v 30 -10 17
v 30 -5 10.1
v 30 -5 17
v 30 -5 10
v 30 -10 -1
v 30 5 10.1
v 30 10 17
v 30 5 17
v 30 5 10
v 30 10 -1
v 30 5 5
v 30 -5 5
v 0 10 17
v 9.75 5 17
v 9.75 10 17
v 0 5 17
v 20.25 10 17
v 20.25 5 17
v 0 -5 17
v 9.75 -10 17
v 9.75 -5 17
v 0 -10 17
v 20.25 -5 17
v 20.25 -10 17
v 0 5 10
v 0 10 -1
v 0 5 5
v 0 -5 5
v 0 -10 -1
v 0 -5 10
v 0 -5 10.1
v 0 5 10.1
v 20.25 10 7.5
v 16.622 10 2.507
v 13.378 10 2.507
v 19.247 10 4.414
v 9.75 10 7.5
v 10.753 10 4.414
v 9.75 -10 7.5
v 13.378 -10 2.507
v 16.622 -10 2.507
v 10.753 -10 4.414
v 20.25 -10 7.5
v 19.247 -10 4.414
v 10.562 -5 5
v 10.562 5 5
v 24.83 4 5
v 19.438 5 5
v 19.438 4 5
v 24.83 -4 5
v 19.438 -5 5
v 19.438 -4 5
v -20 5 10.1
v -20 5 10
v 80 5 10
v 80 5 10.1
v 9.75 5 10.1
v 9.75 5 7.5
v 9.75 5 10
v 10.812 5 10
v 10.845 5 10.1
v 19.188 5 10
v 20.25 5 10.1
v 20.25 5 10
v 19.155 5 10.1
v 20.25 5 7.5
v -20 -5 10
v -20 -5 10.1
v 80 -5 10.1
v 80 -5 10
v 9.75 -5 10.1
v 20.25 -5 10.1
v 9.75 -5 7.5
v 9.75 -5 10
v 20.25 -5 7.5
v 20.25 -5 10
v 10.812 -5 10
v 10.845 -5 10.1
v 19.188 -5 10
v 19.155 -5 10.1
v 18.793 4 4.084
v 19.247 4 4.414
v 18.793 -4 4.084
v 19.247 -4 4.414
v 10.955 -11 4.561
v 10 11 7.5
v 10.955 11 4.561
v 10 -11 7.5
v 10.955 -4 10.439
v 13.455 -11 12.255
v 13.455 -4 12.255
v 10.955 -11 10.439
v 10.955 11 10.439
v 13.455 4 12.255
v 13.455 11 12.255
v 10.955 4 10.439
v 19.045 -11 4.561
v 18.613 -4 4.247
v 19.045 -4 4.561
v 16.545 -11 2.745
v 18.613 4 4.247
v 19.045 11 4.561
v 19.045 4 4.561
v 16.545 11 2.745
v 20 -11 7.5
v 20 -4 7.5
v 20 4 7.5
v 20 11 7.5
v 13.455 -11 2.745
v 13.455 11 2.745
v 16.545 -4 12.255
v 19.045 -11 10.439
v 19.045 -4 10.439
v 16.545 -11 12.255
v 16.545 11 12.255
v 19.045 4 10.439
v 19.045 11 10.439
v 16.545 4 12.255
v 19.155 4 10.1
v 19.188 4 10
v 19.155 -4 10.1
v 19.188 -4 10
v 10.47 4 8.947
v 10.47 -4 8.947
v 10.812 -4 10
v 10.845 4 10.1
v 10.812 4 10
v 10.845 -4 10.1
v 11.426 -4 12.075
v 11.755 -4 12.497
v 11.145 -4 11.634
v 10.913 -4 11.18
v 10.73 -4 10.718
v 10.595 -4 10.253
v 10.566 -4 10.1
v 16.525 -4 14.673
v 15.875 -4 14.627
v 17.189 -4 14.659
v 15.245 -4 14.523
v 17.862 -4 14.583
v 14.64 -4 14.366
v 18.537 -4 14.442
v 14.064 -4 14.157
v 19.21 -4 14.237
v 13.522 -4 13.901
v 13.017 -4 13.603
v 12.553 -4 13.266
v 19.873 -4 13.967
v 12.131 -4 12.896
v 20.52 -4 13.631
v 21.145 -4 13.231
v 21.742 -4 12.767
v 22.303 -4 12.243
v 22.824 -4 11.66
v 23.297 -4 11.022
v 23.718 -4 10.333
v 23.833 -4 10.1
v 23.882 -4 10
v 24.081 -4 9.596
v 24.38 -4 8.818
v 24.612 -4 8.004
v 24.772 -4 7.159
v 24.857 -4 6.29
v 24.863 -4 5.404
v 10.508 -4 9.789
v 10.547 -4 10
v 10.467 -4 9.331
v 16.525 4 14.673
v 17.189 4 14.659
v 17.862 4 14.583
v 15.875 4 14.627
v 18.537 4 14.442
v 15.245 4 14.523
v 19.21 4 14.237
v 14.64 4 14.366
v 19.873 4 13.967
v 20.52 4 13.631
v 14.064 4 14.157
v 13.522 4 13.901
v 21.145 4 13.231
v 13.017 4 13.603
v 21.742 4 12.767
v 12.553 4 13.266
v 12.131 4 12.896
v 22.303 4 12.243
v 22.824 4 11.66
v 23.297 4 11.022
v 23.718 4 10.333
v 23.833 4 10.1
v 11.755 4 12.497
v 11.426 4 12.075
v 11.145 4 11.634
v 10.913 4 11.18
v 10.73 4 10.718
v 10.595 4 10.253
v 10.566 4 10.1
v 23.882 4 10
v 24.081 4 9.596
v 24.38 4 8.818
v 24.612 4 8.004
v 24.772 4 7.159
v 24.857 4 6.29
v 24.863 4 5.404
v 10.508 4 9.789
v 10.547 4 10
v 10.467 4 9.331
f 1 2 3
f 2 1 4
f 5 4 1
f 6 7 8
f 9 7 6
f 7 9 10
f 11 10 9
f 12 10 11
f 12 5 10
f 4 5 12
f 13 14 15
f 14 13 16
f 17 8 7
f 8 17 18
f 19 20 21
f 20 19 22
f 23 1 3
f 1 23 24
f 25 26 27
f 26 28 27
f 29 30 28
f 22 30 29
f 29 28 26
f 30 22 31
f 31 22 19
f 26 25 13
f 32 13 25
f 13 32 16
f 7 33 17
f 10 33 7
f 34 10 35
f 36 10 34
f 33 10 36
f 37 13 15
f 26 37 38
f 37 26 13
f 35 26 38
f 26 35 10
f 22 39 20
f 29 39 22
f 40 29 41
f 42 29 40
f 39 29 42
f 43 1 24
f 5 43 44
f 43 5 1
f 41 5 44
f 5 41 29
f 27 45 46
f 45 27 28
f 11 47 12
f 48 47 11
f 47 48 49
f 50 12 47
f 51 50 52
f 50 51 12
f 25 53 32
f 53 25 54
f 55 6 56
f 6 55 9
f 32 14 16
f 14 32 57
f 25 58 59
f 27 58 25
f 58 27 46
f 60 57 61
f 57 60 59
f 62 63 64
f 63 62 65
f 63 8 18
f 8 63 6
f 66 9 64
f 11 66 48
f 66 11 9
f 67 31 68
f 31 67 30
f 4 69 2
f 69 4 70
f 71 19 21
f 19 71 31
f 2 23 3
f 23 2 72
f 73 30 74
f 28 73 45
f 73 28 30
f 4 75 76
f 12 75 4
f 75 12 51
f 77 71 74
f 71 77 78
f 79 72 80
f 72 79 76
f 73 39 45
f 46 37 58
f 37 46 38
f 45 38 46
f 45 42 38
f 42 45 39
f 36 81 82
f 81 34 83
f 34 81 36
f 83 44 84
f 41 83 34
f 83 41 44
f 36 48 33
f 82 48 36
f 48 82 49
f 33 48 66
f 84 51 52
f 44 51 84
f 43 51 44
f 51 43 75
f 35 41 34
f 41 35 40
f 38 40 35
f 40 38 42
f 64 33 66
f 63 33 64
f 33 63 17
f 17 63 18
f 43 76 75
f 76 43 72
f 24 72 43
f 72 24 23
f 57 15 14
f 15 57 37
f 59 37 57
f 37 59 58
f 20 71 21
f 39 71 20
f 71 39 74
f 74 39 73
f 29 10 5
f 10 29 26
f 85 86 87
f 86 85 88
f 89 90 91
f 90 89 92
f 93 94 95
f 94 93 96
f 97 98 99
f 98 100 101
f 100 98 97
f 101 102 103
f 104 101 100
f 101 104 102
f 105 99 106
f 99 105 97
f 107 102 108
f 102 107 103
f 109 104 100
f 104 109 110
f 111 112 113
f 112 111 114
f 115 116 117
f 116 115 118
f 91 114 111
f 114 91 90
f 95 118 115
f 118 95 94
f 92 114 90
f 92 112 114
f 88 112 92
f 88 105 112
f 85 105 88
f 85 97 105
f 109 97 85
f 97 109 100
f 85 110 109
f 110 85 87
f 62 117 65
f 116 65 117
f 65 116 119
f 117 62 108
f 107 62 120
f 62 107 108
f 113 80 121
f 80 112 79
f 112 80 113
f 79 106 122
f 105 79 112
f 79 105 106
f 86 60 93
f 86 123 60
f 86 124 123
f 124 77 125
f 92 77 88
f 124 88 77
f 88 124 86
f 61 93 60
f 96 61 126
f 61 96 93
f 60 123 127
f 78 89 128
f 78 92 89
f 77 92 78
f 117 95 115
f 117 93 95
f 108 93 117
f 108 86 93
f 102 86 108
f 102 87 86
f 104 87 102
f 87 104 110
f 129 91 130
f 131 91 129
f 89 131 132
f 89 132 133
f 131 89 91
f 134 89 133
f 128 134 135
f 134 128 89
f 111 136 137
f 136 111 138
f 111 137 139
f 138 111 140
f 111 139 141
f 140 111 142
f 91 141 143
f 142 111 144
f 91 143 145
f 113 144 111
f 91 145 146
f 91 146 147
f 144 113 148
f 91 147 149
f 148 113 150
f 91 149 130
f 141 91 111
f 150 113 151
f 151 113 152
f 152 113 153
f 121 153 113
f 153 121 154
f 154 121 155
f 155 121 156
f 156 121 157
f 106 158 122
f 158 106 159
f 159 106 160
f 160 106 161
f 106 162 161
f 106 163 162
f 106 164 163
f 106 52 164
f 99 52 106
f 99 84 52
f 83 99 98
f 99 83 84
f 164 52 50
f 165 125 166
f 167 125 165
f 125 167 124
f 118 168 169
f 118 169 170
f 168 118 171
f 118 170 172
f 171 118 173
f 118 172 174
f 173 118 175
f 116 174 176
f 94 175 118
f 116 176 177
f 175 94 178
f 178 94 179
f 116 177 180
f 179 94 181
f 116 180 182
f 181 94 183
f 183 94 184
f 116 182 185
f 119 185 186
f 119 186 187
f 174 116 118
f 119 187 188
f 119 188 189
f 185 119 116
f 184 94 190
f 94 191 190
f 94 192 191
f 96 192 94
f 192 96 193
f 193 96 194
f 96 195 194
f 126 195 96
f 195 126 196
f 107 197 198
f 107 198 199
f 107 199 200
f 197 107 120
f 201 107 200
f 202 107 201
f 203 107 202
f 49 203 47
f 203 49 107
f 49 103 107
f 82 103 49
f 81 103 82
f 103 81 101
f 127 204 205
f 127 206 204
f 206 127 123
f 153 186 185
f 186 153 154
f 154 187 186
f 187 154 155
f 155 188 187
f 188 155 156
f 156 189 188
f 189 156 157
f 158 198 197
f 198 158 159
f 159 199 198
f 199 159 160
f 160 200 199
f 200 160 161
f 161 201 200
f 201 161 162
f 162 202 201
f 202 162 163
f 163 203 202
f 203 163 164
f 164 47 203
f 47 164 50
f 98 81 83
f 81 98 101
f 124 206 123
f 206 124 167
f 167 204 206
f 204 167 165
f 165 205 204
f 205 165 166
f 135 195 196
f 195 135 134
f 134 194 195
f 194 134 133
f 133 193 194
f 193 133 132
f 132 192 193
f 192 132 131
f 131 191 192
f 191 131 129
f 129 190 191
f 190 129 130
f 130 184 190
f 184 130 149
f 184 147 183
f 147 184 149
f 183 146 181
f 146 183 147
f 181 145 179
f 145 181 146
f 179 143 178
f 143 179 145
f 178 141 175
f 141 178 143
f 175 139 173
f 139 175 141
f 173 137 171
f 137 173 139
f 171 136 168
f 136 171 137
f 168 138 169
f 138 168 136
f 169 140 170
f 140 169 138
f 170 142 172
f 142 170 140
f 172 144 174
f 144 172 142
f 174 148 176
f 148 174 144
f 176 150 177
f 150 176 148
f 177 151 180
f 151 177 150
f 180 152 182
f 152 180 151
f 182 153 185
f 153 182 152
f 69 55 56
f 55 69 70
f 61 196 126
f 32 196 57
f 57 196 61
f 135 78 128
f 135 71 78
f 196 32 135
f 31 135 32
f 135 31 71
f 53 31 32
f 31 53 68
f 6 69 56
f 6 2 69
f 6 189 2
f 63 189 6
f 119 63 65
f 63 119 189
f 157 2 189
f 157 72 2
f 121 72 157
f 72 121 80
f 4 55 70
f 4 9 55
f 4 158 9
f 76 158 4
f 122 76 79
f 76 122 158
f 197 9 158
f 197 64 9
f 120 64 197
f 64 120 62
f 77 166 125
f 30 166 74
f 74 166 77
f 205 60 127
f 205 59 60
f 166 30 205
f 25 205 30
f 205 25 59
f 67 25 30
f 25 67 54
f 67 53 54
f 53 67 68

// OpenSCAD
// a window stopper with rotating wedge
// (all sizes in millimeter)

module window_stopper(

    /* parameters */
    
    // for window
    window_thickness = 10,   // thickness of window frame
    windowsill_dist = 10,        // distance between window and windowsill
    // for window_stopper
    windowsill_adj = 1,     // adjustment for windowsill distance
    stopper_width = 30,     // width of the stopper
    material_thickness = 5,     // material thickness of the stopper
    window_overlap = 7,     // overlap of stopper and window
    axle_dm = 10,       // axle diameter
    axle_clearance = 0.5,       // axle clearance towards bushing
    // for stopper
    wedge_start_r = 0,      // wedge start radius
    wedge_end_r = 11,      // wedge end radius
    wedge_angle = 42,       // start angle of wedge
    lever_depth = 15,       // depth of lever
    lever_length = 40,      // length of lever
    lever_angle = 15,       // start angle of lever
    
) {
    
    $fn = 10;
    
    axle_height =
        material_thickness + (windowsill_dist - material_thickness) / 2;
    
    module window() {
        color("LightSkyBlue")
            translate( [ -20, -window_thickness / 2, windowsill_dist])
                cube( [100, window_thickness, 0.1]);
        }
    
    module stopper_case() {
        case_size = [
            stopper_width,
            window_thickness + material_thickness * 2,
            windowsill_dist + window_overlap
        ];
        
        translate( [0, -case_size.y / 2, 0] )
        difference() {
            cube( case_size );
            axle_bushing = axle_dm + axle_clearance;
            
            translate( [-1, material_thickness, material_thickness] )
                cube( [case_size.x + 2, window_thickness, case_size.z] );
            
            translate( [case_size.x / 2, -1, axle_height] )
                rotate( [-90,0.0])
                    cylinder( d = axle_bushing, h = case_size.y + 2);
            
            translate( [(case_size.x - axle_bushing) / 2, -1, axle_height] )
                cube( [axle_bushing, case_size.y + 2, case_size.z] );
        }
        
        translate( [0, -case_size.y / 2, -windowsill_adj] )
            cube( [case_size.x, case_size.y, windowsill_adj] );
        
        }
    
    module stopper( angle = 0 ) {
        axle_length = window_thickness + material_thickness * 2 + 2;
        
        translate( [stopper_width / 2, -axle_length / 2, axle_height] )
            rotate( [ -90, 0, 0] )
                cylinder( d = axle_dm, h = axle_length );
        
        points = [
            for ( i = [0:5:360] )
                let ( radius = wedge_start_r + (wedge_end_r - wedge_start_r) * i / 360 )
            [ cos(i) * radius, sin(i) * radius ]
        ];
        
//        points = [
//            for ( i = [0:5:360] )
//            [ cos(i) * (wedge_start_r + (wedge_end_r - wedge_start_r) * i / 360), sin(i) * (wedge_start_r + (wedge_end_r - wedge_start_r) * i / 360) ]
//        ];
            
        wedge_width = window_thickness - 2;
            
//            echo(points);
       translate( [stopper_width / 2, -wedge_width / 2, axle_height] )
            rotate( [-90, 0, 0] )
            rotate( [0, 0, wedge_angle + angle] )
            linear_extrude( height = wedge_width )
            polygon(points);
        }
    
    window();
    stopper_case();
    stopper();
    
}

window_stopper( /* parameters */ );
